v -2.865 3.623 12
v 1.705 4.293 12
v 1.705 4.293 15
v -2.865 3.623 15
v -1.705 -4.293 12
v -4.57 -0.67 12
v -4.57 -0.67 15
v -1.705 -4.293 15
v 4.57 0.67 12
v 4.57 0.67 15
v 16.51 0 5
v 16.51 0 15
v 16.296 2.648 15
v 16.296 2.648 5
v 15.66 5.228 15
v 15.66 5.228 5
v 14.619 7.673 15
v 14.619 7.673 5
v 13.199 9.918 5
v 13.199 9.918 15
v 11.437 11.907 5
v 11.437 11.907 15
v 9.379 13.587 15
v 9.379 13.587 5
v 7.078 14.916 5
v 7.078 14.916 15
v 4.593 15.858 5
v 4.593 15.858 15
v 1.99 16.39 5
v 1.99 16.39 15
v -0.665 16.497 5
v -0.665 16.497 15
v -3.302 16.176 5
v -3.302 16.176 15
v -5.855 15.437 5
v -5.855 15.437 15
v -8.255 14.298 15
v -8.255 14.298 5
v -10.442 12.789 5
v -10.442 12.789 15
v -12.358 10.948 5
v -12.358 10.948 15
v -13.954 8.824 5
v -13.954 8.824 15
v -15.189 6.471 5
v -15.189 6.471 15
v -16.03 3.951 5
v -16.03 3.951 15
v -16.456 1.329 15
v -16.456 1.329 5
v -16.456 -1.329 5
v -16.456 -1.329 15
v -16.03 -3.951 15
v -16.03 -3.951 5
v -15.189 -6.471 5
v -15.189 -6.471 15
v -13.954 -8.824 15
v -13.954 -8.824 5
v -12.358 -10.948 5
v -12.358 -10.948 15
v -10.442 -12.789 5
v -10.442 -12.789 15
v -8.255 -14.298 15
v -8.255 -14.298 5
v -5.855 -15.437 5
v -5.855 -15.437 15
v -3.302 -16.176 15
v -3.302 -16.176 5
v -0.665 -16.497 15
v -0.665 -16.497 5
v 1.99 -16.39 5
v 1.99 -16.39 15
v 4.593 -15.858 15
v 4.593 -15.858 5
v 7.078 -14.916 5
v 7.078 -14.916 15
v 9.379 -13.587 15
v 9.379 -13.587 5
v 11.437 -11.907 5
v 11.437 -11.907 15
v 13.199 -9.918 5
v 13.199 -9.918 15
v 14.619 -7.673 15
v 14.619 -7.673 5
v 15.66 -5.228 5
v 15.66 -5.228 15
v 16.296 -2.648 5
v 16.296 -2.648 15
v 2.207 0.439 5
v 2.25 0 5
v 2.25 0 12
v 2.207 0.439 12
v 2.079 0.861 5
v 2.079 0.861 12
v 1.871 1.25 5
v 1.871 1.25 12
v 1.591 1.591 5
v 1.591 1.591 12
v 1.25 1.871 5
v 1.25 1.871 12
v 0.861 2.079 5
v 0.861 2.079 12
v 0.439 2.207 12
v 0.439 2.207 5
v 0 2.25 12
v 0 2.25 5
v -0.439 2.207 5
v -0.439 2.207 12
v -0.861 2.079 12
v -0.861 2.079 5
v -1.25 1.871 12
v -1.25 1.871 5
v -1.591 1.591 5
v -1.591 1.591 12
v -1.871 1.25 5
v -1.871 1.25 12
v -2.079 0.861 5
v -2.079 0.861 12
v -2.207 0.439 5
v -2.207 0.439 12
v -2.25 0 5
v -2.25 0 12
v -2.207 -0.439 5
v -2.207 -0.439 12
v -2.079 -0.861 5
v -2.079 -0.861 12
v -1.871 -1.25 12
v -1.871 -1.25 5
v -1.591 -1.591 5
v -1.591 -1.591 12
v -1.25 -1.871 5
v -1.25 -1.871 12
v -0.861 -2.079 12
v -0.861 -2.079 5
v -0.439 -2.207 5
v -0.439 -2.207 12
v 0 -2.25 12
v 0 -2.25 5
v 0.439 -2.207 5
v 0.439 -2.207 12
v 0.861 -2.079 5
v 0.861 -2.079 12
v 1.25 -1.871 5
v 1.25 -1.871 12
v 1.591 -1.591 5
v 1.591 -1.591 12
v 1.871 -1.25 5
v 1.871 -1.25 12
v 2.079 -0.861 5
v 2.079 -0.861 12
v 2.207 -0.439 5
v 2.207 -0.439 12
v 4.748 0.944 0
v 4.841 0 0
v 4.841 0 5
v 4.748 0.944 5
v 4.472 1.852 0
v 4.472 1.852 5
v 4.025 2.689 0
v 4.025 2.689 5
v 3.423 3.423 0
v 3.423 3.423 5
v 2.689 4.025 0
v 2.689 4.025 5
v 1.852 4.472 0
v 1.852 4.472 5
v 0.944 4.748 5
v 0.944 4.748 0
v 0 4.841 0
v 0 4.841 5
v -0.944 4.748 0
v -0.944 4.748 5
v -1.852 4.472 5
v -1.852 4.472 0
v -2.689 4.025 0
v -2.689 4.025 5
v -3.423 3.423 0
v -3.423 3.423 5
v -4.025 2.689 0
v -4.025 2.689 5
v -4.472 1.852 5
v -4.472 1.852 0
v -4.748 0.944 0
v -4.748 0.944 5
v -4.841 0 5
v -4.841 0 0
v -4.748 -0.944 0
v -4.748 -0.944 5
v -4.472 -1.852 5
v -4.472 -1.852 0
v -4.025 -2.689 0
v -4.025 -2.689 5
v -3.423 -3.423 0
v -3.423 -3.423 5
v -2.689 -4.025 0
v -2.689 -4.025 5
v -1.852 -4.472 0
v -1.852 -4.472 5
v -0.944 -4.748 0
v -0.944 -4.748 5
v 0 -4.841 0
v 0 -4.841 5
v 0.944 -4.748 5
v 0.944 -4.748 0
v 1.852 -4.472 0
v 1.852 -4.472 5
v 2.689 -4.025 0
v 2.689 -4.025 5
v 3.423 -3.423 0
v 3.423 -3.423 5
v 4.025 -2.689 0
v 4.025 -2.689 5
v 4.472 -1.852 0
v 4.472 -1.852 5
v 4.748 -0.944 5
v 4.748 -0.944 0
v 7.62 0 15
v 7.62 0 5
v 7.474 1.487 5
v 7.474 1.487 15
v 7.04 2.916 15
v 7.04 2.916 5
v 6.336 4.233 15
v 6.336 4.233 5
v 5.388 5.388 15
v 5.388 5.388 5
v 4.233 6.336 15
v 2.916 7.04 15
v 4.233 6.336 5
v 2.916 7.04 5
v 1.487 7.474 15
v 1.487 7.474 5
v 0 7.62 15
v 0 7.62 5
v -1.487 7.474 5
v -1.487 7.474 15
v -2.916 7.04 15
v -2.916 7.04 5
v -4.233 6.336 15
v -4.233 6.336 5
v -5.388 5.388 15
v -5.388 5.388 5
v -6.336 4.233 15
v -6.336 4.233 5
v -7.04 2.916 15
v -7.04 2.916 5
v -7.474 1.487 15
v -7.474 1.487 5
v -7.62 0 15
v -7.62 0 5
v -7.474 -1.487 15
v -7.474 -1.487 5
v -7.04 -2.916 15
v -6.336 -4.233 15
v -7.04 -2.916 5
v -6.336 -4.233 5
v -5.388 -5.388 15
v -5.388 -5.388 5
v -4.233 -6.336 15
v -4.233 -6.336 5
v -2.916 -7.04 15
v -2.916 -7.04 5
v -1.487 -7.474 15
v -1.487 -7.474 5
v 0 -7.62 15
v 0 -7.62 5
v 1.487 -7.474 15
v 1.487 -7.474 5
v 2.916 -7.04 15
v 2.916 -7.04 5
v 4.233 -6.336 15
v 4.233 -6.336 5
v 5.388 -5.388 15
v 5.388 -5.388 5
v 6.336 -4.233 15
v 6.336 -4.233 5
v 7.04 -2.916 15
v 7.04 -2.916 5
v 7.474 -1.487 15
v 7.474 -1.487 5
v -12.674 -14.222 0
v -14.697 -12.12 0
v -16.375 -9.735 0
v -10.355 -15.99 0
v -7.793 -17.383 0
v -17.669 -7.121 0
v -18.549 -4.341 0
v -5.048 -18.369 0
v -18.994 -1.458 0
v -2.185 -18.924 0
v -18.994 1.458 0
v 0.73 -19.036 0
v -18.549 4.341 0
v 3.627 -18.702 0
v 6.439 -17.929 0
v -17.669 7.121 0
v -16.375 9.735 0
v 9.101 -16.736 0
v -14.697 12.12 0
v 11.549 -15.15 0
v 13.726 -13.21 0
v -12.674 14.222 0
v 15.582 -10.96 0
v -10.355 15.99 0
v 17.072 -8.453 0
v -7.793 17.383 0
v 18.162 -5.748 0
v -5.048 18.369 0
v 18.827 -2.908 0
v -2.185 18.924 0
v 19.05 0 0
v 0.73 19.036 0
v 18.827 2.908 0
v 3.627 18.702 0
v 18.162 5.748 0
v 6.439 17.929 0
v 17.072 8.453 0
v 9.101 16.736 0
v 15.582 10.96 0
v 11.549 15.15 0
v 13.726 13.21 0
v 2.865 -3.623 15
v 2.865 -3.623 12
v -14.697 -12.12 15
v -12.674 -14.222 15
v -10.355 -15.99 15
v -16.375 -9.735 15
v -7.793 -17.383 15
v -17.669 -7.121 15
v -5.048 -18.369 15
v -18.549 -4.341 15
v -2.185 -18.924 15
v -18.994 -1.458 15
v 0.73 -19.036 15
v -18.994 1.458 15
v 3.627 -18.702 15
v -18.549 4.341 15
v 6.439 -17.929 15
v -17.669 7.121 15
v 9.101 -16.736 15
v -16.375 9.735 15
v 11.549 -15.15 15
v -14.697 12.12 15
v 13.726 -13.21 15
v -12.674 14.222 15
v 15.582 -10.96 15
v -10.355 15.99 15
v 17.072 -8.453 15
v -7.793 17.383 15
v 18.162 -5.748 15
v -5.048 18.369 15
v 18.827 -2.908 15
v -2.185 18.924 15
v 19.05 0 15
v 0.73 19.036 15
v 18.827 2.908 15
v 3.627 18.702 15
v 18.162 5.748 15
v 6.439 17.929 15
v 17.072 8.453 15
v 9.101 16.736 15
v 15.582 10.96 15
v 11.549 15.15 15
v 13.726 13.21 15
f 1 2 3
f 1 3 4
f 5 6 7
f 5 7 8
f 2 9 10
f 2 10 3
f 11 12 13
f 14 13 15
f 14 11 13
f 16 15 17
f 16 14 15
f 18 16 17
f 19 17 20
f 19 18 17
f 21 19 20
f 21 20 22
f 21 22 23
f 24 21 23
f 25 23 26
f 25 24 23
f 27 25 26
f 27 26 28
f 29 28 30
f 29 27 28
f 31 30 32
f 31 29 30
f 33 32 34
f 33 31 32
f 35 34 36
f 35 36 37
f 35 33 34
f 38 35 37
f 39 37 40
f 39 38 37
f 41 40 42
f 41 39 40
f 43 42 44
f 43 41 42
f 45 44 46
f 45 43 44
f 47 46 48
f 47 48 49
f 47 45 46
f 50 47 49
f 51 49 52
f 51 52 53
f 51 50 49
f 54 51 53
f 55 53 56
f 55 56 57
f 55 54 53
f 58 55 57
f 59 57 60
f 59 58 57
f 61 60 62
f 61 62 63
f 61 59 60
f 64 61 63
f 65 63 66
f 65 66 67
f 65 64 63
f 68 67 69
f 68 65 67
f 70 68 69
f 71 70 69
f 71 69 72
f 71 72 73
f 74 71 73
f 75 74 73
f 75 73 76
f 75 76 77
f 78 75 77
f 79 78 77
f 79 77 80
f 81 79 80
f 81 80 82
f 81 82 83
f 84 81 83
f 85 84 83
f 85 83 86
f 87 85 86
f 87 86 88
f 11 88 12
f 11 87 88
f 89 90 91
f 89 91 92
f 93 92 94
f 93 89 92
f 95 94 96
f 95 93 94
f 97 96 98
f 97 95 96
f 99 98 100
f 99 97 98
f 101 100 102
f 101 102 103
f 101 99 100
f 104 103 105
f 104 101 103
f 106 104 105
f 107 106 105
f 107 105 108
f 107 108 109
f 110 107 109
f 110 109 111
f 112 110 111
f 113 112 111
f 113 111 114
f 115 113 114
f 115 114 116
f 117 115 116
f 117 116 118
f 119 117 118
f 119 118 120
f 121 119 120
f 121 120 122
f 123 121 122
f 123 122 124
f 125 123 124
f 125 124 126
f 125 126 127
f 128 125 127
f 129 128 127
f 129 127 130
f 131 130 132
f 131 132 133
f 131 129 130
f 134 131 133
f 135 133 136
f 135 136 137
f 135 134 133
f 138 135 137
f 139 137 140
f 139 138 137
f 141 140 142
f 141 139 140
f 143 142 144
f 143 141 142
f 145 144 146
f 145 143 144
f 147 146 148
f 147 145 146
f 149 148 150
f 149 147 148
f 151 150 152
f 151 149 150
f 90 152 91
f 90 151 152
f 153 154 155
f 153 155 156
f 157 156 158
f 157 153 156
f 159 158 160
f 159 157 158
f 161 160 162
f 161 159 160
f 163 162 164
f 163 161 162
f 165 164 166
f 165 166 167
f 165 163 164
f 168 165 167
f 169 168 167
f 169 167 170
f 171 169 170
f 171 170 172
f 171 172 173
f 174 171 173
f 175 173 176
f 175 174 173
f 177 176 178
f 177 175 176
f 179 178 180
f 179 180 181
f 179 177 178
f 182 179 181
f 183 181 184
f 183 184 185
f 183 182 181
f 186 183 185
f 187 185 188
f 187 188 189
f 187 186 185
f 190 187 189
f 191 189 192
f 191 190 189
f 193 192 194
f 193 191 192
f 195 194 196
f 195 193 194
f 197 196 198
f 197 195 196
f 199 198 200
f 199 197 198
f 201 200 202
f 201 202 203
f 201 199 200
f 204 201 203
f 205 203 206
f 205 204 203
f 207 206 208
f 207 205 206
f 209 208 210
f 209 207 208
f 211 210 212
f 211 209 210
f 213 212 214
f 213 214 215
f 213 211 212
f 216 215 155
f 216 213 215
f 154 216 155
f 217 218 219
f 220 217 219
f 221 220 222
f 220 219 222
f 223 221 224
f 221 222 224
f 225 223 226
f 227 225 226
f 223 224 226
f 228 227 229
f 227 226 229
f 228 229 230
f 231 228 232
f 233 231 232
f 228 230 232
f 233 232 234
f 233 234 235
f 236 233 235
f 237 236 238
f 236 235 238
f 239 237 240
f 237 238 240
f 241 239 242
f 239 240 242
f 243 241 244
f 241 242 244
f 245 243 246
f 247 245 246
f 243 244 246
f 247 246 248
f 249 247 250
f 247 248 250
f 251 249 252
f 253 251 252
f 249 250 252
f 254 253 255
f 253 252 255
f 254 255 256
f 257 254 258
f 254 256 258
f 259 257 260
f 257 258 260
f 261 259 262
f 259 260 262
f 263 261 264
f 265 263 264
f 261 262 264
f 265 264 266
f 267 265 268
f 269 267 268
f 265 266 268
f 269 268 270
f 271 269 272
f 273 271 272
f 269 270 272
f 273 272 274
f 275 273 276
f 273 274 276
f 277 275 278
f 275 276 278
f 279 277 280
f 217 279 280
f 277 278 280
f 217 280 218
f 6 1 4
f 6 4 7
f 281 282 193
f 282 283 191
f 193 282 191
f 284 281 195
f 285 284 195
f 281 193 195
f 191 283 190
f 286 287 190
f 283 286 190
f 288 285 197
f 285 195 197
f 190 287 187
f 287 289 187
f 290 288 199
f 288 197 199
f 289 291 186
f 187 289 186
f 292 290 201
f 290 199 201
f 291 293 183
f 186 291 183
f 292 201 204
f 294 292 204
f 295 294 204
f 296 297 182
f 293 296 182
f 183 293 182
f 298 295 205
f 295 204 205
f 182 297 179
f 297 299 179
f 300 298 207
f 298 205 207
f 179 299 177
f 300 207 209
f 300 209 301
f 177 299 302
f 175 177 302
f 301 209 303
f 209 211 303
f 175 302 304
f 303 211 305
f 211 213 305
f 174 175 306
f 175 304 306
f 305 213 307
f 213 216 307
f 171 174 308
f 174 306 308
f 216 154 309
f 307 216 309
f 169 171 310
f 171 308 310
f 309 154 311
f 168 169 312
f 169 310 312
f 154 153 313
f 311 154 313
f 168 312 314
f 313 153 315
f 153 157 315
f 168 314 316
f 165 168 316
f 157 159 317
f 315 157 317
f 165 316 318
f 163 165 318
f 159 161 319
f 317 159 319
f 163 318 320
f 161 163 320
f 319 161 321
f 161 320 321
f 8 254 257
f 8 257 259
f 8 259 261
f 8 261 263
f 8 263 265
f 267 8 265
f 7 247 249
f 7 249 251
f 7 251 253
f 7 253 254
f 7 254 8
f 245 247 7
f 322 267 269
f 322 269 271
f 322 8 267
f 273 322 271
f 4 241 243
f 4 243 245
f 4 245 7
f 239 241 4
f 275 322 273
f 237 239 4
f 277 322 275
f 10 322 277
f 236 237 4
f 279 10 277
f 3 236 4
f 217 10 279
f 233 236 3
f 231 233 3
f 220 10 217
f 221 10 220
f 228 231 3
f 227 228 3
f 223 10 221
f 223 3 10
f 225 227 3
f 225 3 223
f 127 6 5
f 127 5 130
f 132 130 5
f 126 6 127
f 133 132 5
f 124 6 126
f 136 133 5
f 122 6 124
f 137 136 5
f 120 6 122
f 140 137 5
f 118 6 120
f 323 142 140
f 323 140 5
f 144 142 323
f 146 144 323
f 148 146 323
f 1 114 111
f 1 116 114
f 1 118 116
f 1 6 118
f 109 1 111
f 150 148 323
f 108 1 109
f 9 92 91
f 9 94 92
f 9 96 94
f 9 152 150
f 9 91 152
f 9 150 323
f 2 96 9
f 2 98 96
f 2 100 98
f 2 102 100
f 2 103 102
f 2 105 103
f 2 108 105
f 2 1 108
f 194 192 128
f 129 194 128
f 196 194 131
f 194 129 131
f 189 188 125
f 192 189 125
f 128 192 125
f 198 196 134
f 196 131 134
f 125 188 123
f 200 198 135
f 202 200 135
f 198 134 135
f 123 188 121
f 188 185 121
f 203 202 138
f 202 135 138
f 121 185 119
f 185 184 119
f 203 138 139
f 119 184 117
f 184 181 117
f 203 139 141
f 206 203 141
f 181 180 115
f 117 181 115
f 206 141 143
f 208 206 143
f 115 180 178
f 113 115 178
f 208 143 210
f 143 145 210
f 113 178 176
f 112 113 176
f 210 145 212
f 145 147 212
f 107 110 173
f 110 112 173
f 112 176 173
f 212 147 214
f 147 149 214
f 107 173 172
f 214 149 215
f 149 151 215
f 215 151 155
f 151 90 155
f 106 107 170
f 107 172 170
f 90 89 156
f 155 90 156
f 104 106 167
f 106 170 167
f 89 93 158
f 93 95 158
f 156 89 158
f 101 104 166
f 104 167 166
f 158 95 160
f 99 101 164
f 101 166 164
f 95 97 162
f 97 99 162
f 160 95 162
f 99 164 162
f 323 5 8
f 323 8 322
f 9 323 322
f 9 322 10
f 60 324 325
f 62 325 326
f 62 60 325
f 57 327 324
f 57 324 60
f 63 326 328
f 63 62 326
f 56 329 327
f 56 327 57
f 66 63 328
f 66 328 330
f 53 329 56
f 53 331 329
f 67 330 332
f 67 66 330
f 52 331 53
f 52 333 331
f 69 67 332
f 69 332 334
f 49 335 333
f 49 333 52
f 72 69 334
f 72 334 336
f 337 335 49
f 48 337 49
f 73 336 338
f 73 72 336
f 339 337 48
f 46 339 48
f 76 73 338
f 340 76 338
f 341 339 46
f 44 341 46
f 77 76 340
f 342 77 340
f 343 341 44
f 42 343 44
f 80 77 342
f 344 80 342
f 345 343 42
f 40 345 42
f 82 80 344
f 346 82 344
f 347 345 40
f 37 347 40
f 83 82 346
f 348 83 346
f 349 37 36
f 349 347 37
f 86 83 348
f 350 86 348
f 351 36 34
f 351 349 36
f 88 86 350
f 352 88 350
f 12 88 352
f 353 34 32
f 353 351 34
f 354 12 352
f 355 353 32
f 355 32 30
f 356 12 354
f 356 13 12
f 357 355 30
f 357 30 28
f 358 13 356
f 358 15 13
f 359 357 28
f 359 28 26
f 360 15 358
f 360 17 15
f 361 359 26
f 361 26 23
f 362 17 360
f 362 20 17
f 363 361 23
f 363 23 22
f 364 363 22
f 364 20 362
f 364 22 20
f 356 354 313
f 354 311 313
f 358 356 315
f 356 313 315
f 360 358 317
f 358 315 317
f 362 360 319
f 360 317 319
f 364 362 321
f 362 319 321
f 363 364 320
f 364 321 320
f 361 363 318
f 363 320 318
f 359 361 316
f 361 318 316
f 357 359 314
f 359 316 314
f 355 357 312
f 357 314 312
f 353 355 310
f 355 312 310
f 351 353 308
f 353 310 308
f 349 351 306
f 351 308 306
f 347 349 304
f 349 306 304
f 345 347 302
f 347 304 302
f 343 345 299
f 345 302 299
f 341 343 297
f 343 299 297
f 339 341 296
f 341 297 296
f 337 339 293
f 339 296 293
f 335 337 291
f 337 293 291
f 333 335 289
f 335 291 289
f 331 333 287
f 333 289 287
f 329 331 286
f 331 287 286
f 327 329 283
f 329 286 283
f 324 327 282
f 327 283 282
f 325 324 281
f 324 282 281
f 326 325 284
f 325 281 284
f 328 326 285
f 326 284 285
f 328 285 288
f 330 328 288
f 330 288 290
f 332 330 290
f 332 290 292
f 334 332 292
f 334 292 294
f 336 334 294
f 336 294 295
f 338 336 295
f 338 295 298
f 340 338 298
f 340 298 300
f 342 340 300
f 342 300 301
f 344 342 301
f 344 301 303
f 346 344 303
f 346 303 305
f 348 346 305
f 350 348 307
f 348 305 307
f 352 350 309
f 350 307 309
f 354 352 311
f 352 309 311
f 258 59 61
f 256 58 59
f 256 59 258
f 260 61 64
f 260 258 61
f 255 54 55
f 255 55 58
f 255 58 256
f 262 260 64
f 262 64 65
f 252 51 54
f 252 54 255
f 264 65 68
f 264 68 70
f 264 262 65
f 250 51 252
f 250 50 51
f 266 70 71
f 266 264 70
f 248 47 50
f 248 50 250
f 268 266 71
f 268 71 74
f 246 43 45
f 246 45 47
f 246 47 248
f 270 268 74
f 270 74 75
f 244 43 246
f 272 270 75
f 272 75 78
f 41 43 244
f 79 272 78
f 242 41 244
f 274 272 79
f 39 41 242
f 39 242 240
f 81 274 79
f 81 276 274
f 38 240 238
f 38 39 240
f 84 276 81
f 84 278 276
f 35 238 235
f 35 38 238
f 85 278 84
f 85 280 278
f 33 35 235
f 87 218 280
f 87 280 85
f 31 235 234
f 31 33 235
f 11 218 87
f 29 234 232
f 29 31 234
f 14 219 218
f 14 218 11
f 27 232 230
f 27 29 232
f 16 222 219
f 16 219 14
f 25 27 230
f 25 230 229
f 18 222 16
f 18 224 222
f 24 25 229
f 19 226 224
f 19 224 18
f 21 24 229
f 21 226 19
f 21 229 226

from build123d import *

# Parameters (mm, degrees)
F0_R     = 19.05
F0_R_2   = 16.51
F0_R_3   = 7.62
F0_R_4   = 4.8407005088
F1_DEPTH = 5
F2_START = 5
F0_R_5   = 2.25
F2_DEPTH = 10
F3_START = 12
F3_DEPTH = 8


with BuildPart() as f1:
    # F0 (on Top) → F1 (new body)
    with BuildSketch(Plane.XY):
        Circle(F0_R)
        Circle(F0_R_2, mode=Mode.SUBTRACT)
        Circle(F0_R_2)
        Circle(F0_R_3, mode=Mode.SUBTRACT)
        Circle(F0_R_3)
        Circle(F0_R_4, mode=Mode.SUBTRACT)
    extrude(amount=F1_DEPTH)

    # F0 (on Top) → F2 (join)
    with BuildSketch(Plane.XY.offset(F2_START)):
        Circle(F0_R)
        Circle(F0_R_2, mode=Mode.SUBTRACT)
        Circle(F0_R_3)
        Circle(F0_R_4, mode=Mode.SUBTRACT)
        Circle(F0_R_4)
        Polygon((-2.865183893, 3.6227137055), (1.7047701531, 4.2926788907), (4.5699540462, 0.6699651851), (2.865183893, -3.6227137055), (-1.7047701531, -4.2926788907), (-4.5699540462, -0.6699651851), align=None, mode=Mode.SUBTRACT)
        Polygon((4.5699540462, 0.6699651851), (1.7047701531, 4.2926788907), (-2.865183893, 3.6227137055), (-4.5699540462, -0.6699651851), (-1.7047701531, -4.2926788907), (2.865183893, -3.6227137055), align=None)
        Circle(F0_R_5, mode=Mode.SUBTRACT)
    extrude(amount=F2_DEPTH)

    # F0 (on Top) → F3 (cut)
    with BuildSketch(Plane.XY.offset(F3_START)):
        Polygon((4.5699540462, 0.6699651851), (1.7047701531, 4.2926788907), (-2.865183893, 3.6227137055), (-4.5699540462, -0.6699651851), (-1.7047701531, -4.2926788907), (2.865183893, -3.6227137055), align=None)
        Circle(F0_R_5, mode=Mode.SUBTRACT)
    extrude(amount=F3_DEPTH, mode=Mode.SUBTRACT)


solid = f1.part
